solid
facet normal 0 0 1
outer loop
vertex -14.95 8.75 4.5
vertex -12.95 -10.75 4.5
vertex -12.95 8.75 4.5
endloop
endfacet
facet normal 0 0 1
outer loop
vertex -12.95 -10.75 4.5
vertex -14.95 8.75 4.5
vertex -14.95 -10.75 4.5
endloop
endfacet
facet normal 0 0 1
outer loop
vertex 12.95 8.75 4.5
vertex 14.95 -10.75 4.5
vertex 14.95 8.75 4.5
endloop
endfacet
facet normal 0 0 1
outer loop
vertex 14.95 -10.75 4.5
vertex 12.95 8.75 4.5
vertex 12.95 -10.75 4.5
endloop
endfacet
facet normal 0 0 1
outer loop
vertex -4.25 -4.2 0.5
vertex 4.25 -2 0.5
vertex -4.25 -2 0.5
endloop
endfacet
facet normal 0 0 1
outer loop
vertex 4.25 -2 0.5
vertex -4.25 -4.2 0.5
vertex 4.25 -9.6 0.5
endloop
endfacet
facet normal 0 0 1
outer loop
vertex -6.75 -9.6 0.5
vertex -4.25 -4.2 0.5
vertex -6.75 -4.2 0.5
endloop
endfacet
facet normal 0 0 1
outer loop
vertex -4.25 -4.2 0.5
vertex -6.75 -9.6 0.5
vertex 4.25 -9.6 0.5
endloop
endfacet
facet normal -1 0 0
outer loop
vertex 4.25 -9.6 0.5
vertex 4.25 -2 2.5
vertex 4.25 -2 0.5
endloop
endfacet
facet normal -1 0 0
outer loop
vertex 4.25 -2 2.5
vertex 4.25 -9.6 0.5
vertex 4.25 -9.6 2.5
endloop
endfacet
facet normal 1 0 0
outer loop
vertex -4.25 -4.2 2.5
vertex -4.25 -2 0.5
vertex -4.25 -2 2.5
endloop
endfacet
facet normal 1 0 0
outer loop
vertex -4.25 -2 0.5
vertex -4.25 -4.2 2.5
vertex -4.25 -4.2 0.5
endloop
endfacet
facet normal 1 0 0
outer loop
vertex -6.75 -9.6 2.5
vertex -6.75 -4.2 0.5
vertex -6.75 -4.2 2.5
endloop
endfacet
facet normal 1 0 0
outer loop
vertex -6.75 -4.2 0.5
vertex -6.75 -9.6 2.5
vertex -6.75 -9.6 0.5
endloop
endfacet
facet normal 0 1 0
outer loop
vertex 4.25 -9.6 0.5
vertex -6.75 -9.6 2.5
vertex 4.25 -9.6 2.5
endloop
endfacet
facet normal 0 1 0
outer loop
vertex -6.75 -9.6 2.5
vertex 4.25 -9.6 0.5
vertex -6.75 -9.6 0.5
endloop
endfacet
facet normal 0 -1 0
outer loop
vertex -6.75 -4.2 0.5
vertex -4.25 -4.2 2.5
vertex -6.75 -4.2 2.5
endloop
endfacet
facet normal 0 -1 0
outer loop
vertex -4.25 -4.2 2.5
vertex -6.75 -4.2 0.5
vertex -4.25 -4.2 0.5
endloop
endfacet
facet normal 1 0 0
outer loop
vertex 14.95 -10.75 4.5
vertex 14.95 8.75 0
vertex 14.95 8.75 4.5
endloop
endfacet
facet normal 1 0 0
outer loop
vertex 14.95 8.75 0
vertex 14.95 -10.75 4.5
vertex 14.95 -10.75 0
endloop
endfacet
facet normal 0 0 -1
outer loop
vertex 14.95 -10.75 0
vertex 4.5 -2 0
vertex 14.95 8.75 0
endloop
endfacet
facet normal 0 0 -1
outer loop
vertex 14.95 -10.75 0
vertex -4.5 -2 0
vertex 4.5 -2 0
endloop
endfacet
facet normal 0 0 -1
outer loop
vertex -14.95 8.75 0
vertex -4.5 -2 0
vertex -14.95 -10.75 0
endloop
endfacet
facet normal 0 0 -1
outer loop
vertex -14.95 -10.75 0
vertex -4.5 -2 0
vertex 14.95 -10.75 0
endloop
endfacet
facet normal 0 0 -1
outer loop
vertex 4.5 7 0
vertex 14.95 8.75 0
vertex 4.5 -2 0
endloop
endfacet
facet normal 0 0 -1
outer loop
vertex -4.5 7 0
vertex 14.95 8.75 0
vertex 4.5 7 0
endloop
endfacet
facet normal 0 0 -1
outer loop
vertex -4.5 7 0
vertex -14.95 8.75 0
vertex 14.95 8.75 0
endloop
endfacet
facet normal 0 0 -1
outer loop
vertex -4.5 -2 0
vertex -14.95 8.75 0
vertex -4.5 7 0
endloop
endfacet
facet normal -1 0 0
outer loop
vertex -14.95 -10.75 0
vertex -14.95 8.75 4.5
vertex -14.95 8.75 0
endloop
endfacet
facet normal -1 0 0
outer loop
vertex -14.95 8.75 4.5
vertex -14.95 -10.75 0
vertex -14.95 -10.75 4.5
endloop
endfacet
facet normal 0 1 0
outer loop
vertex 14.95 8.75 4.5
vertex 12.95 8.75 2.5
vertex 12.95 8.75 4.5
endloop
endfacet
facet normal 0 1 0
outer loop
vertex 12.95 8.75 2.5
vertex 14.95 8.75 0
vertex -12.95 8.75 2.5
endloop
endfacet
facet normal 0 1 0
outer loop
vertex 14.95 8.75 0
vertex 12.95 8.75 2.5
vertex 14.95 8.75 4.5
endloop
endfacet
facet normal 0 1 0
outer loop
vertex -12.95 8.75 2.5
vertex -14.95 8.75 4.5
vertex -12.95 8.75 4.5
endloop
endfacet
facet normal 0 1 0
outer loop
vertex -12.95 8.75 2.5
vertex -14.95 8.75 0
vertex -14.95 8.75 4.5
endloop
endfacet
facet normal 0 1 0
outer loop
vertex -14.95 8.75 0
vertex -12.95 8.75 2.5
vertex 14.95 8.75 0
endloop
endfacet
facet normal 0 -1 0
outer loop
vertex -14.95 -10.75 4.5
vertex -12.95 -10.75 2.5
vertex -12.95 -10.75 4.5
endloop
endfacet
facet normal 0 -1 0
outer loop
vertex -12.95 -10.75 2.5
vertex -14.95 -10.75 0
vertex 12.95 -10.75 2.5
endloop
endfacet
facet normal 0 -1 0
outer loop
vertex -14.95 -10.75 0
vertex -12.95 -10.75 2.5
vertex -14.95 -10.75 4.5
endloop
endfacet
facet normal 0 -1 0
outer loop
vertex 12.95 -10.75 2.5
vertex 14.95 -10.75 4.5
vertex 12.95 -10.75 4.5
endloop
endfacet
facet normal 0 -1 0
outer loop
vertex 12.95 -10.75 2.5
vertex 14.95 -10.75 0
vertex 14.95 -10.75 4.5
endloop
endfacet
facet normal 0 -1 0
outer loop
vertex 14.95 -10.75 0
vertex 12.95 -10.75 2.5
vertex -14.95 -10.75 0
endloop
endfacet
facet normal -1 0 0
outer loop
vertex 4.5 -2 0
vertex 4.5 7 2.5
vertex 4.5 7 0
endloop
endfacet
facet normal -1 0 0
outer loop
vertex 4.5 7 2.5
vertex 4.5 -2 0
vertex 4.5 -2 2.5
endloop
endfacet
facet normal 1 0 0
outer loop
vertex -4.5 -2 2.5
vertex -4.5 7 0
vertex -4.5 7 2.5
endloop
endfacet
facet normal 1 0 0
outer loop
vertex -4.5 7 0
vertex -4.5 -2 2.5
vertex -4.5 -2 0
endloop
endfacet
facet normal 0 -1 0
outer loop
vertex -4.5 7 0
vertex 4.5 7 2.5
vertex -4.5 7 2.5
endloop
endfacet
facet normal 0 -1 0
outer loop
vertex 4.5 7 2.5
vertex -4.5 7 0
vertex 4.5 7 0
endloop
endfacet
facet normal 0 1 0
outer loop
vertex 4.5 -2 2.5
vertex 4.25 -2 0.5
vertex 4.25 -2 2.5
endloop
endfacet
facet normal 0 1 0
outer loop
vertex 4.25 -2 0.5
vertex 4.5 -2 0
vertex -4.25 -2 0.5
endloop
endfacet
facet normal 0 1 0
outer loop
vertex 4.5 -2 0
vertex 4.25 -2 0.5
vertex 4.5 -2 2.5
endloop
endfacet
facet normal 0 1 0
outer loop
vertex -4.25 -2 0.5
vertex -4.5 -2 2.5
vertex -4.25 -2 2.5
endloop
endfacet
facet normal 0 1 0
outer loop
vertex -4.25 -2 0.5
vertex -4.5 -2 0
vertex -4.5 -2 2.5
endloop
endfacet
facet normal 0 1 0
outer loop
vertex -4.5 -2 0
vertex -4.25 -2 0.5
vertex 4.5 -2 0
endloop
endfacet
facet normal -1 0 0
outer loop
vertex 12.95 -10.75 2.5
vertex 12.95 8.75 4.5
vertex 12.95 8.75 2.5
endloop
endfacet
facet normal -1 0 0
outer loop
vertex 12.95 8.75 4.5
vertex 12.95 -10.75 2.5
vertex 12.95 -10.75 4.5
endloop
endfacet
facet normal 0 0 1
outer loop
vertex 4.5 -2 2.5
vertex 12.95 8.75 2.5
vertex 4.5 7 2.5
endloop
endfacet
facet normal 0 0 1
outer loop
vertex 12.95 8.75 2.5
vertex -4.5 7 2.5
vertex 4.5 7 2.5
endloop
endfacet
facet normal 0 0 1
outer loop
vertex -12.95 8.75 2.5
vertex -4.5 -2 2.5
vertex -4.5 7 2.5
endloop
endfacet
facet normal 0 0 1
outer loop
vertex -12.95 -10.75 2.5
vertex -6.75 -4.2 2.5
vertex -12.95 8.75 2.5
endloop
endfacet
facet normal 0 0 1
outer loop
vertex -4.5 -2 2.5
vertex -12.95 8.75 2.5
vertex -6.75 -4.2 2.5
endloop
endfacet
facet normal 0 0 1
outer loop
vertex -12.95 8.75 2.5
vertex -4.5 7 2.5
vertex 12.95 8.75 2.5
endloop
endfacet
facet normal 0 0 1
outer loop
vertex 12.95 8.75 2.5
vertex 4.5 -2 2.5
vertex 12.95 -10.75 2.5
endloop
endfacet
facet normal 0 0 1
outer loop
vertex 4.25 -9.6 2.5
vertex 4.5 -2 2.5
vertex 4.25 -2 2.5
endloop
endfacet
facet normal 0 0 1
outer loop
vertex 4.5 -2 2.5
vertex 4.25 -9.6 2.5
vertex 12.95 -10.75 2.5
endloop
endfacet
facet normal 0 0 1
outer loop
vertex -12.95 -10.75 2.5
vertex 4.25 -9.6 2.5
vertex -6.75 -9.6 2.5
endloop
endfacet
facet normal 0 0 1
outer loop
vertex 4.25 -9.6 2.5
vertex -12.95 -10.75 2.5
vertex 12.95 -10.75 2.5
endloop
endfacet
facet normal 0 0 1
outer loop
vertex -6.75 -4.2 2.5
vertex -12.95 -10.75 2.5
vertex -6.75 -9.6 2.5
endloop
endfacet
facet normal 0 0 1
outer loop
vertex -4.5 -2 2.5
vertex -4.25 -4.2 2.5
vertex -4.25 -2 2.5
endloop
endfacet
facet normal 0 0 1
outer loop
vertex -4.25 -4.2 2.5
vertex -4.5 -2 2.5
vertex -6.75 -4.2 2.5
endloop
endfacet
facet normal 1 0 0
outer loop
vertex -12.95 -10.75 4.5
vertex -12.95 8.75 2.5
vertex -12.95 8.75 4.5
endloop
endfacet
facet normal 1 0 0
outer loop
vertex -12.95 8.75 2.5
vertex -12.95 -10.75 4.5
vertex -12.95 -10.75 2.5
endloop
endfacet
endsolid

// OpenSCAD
// file: ../libs/libdict.scad
// This library add dictionary like features to openscad
// the dictionary is a list of pairs as we cannot define new types.
// Unlike a python dictionary we cannot do a proper hash table for speed
// so everything is build around the OpenSCAD search function
// There are a lot of assert statements to ensure data in the "dictionary"
// is in the format of
// * A list of lists
// * Each internal list has a length of two
// * First element of each internal list is a string (the key)
// * All keys are unique.


// Private function:
// This function returns true if the value is in the list
// value must be a string.
// No error checking, for use by is_in only!
function _is_in_str(value, list) =
    search([value], list) != [[]];

// Private function:
// This function returns true if the value is in the list
// value must be a number.
// No error checking, for use by is_in only!
function _is_in_num(value, list) =
    search(value, list) != [];


// This function returns true if the value is in the list
// value must be a string or a number.
function is_in(value, list) =
    assert(is_num(value) || is_string(value) , "is_in: value must be a number or string")
    assert(is_list(list), "is_in: list must be a list")
    is_num(value) ? _is_in_num(value, list) : _is_in_str(value, list);

/**
 * Sum a list
 * This recursive function sums a list.  It should be called with one
 * argument (the list); the other two arguments simply allow it to be
 * "tail-recursive" which lets OpenSCAD optimise it better.  This is
 * very close to the example given in the OpenSCAD docs.
 */
function _libdict_sum_list(list, starting_element=0, running_total=0) =
    starting_element >= len(list) ?
        running_total :
        _libdict_sum_list(list, starting_element + 1, running_total + list[starting_element]);

/**
 * When checking a list for uniqueness, we can get "errant matches".
 * An errant match is when a non-list matches with the first element in a list.
 * i.e. it would consider [1, [1,0]] to be non-unique. We cannot know which 
 * element is the non-list but we do know that it is errant if exactly one 
 * of them is not a list.
 * If two elements are non-lists, they must be identical in order to have matched.  
 * Similarly, if all elements are lists, they must be identical because ``search`` 
 * will have matched them as whole lists.
 * The argument "list" is the list we are checking for uniqueness, and "match" is 
 * a vector of indices that have been returned by ``search``.
 */
function _check_errant_match(list, match) = let(
    non_list = [for (m = match) is_list(list[m])? 0 : 1],
    number_of_non_lists = _libdict_sum_list(non_list)
) number_of_non_lists == 1 ? 0 : 1;

// Returns true if all emements in list are unique.
function is_unique(list) =
    assert(is_list(list), "is_unique: list must be a list")
    let(
        matches = search(list, list, 0),
        // Assign 1 or 0 depending on is the match length for each element
        // return wether any matches are greater than one (mathcing more than
        // itself)
        // note cannot search for true or false so using 1 and zero
        bool_list = [for (match = matches) if (len(match)==1) 0
            // should put a 1 here to show they matched but in the case of
            // [1, [1]] it will match both, so need to check if they are
            // both lists or both not list
            else _check_errant_match(list, match)]
    ) !is_in(1, bool_list);

// Private function:
// Checks that the input is a list and that every element is a list
// of length 2.
// No error checking, for use by valid_dict only!
function _is_pairs(list) =
    !is_list(list) ? false :
        len(list)==0 ? false :
            !is_in(0, [for (pair = list) is_list(pair) && len(pair)==2 ? 1: 0]);

// Private function:
// Checks all elements in the list are strings
// No error checking, for use by valid_dict only!
// Strings can't be empty
function _is_list_of_strings(list) =
    !is_in(0, [for (item = list) is_string(item) && len(item)>0 ? 1: 0]);

// Private function:
// Returns the keus in a dictionary
// No error checking, for use by valid_dict only!
function _keylist(dict)  = [for (pair=dict) pair[0]];

function valid_dict(dict) =
    //if the input are not pairs return instantly
    !_is_pairs(dict) ? false : let (
        //if they are pairs get all keys
        keys = _keylist(dict),
        all_strings =  _is_list_of_strings(keys),
        unique = is_unique(keys)
    ) (all_strings && unique) ? true : false;

// Key lookup for key value pair "dictionary".
// Unlike the built in lookup this works with strings.
function key_lookup(key, dict) =
    assert(is_string(key), "`key` must be a string")
    assert(valid_dict(dict), "`dict` must be a valid 'dictionary'")
    let(
        // key is in [] because otherwise openscad will search for each letter rather than the string.
        index = search([key], dict, 1, 0)[0]
    )  assert (index!=[], "Key lookup failed, key not found!") dict[index][1];

// Creates a new dictionary with a key value pair replaced. Pair must already
// be in dictionary.
function replace_value(key, value, dict) =
    assert(is_string(key), "`key` must be a string")
    assert(valid_dict(dict), "`dict` must be a valid 'dictionary'")
    assert(is_in(key, _keylist(dict)), "`key` not found in dictionary!")
    [for (kv_pair = dict) key!=kv_pair[0] ? kv_pair : [key, value]];


// Creates a new dictionary with a a set of key value pair replaced
// both inputs must be a dictionary. All keys in input must already be
// in dictionary
function replace_multiple_values(rep_dict, dict) =
    assert(valid_dict(rep_dict), "`rep dict` must be a valid 'dictionary'")
    assert(valid_dict(dict), "`dict` must be a valid 'dictionary'")
    let(
        // loop over all keys in replacement dict checking they are in the original
        rep_keys = [for (key = _keylist(rep_dict))
            assert(is_in(key, _keylist(dict)), "`key` not found in dictionary!")
            key
        ]
    ) //Finally return the updated dictionary using this long list comprehension.
    [
        for (kv_pair = dict) let(
            key = kv_pair[0],
            // check if this key is in the replacement dictionary and if so return index
            // key is in [] because otherwise openscad will search for each letter rather
            // than the string.
            index = search([key], rep_dict, 1, 0)[0]
            // if index is empty return original key value pair, else return the key with
            // the replaced value
        ) index == [] ? kv_pair : [key, rep_dict[index][1]]
    ];
// main file
// this file just pulls out one module from picamera_2

use <../libs/cameras/picamera_2.scad>

picamera_2_gripper();
